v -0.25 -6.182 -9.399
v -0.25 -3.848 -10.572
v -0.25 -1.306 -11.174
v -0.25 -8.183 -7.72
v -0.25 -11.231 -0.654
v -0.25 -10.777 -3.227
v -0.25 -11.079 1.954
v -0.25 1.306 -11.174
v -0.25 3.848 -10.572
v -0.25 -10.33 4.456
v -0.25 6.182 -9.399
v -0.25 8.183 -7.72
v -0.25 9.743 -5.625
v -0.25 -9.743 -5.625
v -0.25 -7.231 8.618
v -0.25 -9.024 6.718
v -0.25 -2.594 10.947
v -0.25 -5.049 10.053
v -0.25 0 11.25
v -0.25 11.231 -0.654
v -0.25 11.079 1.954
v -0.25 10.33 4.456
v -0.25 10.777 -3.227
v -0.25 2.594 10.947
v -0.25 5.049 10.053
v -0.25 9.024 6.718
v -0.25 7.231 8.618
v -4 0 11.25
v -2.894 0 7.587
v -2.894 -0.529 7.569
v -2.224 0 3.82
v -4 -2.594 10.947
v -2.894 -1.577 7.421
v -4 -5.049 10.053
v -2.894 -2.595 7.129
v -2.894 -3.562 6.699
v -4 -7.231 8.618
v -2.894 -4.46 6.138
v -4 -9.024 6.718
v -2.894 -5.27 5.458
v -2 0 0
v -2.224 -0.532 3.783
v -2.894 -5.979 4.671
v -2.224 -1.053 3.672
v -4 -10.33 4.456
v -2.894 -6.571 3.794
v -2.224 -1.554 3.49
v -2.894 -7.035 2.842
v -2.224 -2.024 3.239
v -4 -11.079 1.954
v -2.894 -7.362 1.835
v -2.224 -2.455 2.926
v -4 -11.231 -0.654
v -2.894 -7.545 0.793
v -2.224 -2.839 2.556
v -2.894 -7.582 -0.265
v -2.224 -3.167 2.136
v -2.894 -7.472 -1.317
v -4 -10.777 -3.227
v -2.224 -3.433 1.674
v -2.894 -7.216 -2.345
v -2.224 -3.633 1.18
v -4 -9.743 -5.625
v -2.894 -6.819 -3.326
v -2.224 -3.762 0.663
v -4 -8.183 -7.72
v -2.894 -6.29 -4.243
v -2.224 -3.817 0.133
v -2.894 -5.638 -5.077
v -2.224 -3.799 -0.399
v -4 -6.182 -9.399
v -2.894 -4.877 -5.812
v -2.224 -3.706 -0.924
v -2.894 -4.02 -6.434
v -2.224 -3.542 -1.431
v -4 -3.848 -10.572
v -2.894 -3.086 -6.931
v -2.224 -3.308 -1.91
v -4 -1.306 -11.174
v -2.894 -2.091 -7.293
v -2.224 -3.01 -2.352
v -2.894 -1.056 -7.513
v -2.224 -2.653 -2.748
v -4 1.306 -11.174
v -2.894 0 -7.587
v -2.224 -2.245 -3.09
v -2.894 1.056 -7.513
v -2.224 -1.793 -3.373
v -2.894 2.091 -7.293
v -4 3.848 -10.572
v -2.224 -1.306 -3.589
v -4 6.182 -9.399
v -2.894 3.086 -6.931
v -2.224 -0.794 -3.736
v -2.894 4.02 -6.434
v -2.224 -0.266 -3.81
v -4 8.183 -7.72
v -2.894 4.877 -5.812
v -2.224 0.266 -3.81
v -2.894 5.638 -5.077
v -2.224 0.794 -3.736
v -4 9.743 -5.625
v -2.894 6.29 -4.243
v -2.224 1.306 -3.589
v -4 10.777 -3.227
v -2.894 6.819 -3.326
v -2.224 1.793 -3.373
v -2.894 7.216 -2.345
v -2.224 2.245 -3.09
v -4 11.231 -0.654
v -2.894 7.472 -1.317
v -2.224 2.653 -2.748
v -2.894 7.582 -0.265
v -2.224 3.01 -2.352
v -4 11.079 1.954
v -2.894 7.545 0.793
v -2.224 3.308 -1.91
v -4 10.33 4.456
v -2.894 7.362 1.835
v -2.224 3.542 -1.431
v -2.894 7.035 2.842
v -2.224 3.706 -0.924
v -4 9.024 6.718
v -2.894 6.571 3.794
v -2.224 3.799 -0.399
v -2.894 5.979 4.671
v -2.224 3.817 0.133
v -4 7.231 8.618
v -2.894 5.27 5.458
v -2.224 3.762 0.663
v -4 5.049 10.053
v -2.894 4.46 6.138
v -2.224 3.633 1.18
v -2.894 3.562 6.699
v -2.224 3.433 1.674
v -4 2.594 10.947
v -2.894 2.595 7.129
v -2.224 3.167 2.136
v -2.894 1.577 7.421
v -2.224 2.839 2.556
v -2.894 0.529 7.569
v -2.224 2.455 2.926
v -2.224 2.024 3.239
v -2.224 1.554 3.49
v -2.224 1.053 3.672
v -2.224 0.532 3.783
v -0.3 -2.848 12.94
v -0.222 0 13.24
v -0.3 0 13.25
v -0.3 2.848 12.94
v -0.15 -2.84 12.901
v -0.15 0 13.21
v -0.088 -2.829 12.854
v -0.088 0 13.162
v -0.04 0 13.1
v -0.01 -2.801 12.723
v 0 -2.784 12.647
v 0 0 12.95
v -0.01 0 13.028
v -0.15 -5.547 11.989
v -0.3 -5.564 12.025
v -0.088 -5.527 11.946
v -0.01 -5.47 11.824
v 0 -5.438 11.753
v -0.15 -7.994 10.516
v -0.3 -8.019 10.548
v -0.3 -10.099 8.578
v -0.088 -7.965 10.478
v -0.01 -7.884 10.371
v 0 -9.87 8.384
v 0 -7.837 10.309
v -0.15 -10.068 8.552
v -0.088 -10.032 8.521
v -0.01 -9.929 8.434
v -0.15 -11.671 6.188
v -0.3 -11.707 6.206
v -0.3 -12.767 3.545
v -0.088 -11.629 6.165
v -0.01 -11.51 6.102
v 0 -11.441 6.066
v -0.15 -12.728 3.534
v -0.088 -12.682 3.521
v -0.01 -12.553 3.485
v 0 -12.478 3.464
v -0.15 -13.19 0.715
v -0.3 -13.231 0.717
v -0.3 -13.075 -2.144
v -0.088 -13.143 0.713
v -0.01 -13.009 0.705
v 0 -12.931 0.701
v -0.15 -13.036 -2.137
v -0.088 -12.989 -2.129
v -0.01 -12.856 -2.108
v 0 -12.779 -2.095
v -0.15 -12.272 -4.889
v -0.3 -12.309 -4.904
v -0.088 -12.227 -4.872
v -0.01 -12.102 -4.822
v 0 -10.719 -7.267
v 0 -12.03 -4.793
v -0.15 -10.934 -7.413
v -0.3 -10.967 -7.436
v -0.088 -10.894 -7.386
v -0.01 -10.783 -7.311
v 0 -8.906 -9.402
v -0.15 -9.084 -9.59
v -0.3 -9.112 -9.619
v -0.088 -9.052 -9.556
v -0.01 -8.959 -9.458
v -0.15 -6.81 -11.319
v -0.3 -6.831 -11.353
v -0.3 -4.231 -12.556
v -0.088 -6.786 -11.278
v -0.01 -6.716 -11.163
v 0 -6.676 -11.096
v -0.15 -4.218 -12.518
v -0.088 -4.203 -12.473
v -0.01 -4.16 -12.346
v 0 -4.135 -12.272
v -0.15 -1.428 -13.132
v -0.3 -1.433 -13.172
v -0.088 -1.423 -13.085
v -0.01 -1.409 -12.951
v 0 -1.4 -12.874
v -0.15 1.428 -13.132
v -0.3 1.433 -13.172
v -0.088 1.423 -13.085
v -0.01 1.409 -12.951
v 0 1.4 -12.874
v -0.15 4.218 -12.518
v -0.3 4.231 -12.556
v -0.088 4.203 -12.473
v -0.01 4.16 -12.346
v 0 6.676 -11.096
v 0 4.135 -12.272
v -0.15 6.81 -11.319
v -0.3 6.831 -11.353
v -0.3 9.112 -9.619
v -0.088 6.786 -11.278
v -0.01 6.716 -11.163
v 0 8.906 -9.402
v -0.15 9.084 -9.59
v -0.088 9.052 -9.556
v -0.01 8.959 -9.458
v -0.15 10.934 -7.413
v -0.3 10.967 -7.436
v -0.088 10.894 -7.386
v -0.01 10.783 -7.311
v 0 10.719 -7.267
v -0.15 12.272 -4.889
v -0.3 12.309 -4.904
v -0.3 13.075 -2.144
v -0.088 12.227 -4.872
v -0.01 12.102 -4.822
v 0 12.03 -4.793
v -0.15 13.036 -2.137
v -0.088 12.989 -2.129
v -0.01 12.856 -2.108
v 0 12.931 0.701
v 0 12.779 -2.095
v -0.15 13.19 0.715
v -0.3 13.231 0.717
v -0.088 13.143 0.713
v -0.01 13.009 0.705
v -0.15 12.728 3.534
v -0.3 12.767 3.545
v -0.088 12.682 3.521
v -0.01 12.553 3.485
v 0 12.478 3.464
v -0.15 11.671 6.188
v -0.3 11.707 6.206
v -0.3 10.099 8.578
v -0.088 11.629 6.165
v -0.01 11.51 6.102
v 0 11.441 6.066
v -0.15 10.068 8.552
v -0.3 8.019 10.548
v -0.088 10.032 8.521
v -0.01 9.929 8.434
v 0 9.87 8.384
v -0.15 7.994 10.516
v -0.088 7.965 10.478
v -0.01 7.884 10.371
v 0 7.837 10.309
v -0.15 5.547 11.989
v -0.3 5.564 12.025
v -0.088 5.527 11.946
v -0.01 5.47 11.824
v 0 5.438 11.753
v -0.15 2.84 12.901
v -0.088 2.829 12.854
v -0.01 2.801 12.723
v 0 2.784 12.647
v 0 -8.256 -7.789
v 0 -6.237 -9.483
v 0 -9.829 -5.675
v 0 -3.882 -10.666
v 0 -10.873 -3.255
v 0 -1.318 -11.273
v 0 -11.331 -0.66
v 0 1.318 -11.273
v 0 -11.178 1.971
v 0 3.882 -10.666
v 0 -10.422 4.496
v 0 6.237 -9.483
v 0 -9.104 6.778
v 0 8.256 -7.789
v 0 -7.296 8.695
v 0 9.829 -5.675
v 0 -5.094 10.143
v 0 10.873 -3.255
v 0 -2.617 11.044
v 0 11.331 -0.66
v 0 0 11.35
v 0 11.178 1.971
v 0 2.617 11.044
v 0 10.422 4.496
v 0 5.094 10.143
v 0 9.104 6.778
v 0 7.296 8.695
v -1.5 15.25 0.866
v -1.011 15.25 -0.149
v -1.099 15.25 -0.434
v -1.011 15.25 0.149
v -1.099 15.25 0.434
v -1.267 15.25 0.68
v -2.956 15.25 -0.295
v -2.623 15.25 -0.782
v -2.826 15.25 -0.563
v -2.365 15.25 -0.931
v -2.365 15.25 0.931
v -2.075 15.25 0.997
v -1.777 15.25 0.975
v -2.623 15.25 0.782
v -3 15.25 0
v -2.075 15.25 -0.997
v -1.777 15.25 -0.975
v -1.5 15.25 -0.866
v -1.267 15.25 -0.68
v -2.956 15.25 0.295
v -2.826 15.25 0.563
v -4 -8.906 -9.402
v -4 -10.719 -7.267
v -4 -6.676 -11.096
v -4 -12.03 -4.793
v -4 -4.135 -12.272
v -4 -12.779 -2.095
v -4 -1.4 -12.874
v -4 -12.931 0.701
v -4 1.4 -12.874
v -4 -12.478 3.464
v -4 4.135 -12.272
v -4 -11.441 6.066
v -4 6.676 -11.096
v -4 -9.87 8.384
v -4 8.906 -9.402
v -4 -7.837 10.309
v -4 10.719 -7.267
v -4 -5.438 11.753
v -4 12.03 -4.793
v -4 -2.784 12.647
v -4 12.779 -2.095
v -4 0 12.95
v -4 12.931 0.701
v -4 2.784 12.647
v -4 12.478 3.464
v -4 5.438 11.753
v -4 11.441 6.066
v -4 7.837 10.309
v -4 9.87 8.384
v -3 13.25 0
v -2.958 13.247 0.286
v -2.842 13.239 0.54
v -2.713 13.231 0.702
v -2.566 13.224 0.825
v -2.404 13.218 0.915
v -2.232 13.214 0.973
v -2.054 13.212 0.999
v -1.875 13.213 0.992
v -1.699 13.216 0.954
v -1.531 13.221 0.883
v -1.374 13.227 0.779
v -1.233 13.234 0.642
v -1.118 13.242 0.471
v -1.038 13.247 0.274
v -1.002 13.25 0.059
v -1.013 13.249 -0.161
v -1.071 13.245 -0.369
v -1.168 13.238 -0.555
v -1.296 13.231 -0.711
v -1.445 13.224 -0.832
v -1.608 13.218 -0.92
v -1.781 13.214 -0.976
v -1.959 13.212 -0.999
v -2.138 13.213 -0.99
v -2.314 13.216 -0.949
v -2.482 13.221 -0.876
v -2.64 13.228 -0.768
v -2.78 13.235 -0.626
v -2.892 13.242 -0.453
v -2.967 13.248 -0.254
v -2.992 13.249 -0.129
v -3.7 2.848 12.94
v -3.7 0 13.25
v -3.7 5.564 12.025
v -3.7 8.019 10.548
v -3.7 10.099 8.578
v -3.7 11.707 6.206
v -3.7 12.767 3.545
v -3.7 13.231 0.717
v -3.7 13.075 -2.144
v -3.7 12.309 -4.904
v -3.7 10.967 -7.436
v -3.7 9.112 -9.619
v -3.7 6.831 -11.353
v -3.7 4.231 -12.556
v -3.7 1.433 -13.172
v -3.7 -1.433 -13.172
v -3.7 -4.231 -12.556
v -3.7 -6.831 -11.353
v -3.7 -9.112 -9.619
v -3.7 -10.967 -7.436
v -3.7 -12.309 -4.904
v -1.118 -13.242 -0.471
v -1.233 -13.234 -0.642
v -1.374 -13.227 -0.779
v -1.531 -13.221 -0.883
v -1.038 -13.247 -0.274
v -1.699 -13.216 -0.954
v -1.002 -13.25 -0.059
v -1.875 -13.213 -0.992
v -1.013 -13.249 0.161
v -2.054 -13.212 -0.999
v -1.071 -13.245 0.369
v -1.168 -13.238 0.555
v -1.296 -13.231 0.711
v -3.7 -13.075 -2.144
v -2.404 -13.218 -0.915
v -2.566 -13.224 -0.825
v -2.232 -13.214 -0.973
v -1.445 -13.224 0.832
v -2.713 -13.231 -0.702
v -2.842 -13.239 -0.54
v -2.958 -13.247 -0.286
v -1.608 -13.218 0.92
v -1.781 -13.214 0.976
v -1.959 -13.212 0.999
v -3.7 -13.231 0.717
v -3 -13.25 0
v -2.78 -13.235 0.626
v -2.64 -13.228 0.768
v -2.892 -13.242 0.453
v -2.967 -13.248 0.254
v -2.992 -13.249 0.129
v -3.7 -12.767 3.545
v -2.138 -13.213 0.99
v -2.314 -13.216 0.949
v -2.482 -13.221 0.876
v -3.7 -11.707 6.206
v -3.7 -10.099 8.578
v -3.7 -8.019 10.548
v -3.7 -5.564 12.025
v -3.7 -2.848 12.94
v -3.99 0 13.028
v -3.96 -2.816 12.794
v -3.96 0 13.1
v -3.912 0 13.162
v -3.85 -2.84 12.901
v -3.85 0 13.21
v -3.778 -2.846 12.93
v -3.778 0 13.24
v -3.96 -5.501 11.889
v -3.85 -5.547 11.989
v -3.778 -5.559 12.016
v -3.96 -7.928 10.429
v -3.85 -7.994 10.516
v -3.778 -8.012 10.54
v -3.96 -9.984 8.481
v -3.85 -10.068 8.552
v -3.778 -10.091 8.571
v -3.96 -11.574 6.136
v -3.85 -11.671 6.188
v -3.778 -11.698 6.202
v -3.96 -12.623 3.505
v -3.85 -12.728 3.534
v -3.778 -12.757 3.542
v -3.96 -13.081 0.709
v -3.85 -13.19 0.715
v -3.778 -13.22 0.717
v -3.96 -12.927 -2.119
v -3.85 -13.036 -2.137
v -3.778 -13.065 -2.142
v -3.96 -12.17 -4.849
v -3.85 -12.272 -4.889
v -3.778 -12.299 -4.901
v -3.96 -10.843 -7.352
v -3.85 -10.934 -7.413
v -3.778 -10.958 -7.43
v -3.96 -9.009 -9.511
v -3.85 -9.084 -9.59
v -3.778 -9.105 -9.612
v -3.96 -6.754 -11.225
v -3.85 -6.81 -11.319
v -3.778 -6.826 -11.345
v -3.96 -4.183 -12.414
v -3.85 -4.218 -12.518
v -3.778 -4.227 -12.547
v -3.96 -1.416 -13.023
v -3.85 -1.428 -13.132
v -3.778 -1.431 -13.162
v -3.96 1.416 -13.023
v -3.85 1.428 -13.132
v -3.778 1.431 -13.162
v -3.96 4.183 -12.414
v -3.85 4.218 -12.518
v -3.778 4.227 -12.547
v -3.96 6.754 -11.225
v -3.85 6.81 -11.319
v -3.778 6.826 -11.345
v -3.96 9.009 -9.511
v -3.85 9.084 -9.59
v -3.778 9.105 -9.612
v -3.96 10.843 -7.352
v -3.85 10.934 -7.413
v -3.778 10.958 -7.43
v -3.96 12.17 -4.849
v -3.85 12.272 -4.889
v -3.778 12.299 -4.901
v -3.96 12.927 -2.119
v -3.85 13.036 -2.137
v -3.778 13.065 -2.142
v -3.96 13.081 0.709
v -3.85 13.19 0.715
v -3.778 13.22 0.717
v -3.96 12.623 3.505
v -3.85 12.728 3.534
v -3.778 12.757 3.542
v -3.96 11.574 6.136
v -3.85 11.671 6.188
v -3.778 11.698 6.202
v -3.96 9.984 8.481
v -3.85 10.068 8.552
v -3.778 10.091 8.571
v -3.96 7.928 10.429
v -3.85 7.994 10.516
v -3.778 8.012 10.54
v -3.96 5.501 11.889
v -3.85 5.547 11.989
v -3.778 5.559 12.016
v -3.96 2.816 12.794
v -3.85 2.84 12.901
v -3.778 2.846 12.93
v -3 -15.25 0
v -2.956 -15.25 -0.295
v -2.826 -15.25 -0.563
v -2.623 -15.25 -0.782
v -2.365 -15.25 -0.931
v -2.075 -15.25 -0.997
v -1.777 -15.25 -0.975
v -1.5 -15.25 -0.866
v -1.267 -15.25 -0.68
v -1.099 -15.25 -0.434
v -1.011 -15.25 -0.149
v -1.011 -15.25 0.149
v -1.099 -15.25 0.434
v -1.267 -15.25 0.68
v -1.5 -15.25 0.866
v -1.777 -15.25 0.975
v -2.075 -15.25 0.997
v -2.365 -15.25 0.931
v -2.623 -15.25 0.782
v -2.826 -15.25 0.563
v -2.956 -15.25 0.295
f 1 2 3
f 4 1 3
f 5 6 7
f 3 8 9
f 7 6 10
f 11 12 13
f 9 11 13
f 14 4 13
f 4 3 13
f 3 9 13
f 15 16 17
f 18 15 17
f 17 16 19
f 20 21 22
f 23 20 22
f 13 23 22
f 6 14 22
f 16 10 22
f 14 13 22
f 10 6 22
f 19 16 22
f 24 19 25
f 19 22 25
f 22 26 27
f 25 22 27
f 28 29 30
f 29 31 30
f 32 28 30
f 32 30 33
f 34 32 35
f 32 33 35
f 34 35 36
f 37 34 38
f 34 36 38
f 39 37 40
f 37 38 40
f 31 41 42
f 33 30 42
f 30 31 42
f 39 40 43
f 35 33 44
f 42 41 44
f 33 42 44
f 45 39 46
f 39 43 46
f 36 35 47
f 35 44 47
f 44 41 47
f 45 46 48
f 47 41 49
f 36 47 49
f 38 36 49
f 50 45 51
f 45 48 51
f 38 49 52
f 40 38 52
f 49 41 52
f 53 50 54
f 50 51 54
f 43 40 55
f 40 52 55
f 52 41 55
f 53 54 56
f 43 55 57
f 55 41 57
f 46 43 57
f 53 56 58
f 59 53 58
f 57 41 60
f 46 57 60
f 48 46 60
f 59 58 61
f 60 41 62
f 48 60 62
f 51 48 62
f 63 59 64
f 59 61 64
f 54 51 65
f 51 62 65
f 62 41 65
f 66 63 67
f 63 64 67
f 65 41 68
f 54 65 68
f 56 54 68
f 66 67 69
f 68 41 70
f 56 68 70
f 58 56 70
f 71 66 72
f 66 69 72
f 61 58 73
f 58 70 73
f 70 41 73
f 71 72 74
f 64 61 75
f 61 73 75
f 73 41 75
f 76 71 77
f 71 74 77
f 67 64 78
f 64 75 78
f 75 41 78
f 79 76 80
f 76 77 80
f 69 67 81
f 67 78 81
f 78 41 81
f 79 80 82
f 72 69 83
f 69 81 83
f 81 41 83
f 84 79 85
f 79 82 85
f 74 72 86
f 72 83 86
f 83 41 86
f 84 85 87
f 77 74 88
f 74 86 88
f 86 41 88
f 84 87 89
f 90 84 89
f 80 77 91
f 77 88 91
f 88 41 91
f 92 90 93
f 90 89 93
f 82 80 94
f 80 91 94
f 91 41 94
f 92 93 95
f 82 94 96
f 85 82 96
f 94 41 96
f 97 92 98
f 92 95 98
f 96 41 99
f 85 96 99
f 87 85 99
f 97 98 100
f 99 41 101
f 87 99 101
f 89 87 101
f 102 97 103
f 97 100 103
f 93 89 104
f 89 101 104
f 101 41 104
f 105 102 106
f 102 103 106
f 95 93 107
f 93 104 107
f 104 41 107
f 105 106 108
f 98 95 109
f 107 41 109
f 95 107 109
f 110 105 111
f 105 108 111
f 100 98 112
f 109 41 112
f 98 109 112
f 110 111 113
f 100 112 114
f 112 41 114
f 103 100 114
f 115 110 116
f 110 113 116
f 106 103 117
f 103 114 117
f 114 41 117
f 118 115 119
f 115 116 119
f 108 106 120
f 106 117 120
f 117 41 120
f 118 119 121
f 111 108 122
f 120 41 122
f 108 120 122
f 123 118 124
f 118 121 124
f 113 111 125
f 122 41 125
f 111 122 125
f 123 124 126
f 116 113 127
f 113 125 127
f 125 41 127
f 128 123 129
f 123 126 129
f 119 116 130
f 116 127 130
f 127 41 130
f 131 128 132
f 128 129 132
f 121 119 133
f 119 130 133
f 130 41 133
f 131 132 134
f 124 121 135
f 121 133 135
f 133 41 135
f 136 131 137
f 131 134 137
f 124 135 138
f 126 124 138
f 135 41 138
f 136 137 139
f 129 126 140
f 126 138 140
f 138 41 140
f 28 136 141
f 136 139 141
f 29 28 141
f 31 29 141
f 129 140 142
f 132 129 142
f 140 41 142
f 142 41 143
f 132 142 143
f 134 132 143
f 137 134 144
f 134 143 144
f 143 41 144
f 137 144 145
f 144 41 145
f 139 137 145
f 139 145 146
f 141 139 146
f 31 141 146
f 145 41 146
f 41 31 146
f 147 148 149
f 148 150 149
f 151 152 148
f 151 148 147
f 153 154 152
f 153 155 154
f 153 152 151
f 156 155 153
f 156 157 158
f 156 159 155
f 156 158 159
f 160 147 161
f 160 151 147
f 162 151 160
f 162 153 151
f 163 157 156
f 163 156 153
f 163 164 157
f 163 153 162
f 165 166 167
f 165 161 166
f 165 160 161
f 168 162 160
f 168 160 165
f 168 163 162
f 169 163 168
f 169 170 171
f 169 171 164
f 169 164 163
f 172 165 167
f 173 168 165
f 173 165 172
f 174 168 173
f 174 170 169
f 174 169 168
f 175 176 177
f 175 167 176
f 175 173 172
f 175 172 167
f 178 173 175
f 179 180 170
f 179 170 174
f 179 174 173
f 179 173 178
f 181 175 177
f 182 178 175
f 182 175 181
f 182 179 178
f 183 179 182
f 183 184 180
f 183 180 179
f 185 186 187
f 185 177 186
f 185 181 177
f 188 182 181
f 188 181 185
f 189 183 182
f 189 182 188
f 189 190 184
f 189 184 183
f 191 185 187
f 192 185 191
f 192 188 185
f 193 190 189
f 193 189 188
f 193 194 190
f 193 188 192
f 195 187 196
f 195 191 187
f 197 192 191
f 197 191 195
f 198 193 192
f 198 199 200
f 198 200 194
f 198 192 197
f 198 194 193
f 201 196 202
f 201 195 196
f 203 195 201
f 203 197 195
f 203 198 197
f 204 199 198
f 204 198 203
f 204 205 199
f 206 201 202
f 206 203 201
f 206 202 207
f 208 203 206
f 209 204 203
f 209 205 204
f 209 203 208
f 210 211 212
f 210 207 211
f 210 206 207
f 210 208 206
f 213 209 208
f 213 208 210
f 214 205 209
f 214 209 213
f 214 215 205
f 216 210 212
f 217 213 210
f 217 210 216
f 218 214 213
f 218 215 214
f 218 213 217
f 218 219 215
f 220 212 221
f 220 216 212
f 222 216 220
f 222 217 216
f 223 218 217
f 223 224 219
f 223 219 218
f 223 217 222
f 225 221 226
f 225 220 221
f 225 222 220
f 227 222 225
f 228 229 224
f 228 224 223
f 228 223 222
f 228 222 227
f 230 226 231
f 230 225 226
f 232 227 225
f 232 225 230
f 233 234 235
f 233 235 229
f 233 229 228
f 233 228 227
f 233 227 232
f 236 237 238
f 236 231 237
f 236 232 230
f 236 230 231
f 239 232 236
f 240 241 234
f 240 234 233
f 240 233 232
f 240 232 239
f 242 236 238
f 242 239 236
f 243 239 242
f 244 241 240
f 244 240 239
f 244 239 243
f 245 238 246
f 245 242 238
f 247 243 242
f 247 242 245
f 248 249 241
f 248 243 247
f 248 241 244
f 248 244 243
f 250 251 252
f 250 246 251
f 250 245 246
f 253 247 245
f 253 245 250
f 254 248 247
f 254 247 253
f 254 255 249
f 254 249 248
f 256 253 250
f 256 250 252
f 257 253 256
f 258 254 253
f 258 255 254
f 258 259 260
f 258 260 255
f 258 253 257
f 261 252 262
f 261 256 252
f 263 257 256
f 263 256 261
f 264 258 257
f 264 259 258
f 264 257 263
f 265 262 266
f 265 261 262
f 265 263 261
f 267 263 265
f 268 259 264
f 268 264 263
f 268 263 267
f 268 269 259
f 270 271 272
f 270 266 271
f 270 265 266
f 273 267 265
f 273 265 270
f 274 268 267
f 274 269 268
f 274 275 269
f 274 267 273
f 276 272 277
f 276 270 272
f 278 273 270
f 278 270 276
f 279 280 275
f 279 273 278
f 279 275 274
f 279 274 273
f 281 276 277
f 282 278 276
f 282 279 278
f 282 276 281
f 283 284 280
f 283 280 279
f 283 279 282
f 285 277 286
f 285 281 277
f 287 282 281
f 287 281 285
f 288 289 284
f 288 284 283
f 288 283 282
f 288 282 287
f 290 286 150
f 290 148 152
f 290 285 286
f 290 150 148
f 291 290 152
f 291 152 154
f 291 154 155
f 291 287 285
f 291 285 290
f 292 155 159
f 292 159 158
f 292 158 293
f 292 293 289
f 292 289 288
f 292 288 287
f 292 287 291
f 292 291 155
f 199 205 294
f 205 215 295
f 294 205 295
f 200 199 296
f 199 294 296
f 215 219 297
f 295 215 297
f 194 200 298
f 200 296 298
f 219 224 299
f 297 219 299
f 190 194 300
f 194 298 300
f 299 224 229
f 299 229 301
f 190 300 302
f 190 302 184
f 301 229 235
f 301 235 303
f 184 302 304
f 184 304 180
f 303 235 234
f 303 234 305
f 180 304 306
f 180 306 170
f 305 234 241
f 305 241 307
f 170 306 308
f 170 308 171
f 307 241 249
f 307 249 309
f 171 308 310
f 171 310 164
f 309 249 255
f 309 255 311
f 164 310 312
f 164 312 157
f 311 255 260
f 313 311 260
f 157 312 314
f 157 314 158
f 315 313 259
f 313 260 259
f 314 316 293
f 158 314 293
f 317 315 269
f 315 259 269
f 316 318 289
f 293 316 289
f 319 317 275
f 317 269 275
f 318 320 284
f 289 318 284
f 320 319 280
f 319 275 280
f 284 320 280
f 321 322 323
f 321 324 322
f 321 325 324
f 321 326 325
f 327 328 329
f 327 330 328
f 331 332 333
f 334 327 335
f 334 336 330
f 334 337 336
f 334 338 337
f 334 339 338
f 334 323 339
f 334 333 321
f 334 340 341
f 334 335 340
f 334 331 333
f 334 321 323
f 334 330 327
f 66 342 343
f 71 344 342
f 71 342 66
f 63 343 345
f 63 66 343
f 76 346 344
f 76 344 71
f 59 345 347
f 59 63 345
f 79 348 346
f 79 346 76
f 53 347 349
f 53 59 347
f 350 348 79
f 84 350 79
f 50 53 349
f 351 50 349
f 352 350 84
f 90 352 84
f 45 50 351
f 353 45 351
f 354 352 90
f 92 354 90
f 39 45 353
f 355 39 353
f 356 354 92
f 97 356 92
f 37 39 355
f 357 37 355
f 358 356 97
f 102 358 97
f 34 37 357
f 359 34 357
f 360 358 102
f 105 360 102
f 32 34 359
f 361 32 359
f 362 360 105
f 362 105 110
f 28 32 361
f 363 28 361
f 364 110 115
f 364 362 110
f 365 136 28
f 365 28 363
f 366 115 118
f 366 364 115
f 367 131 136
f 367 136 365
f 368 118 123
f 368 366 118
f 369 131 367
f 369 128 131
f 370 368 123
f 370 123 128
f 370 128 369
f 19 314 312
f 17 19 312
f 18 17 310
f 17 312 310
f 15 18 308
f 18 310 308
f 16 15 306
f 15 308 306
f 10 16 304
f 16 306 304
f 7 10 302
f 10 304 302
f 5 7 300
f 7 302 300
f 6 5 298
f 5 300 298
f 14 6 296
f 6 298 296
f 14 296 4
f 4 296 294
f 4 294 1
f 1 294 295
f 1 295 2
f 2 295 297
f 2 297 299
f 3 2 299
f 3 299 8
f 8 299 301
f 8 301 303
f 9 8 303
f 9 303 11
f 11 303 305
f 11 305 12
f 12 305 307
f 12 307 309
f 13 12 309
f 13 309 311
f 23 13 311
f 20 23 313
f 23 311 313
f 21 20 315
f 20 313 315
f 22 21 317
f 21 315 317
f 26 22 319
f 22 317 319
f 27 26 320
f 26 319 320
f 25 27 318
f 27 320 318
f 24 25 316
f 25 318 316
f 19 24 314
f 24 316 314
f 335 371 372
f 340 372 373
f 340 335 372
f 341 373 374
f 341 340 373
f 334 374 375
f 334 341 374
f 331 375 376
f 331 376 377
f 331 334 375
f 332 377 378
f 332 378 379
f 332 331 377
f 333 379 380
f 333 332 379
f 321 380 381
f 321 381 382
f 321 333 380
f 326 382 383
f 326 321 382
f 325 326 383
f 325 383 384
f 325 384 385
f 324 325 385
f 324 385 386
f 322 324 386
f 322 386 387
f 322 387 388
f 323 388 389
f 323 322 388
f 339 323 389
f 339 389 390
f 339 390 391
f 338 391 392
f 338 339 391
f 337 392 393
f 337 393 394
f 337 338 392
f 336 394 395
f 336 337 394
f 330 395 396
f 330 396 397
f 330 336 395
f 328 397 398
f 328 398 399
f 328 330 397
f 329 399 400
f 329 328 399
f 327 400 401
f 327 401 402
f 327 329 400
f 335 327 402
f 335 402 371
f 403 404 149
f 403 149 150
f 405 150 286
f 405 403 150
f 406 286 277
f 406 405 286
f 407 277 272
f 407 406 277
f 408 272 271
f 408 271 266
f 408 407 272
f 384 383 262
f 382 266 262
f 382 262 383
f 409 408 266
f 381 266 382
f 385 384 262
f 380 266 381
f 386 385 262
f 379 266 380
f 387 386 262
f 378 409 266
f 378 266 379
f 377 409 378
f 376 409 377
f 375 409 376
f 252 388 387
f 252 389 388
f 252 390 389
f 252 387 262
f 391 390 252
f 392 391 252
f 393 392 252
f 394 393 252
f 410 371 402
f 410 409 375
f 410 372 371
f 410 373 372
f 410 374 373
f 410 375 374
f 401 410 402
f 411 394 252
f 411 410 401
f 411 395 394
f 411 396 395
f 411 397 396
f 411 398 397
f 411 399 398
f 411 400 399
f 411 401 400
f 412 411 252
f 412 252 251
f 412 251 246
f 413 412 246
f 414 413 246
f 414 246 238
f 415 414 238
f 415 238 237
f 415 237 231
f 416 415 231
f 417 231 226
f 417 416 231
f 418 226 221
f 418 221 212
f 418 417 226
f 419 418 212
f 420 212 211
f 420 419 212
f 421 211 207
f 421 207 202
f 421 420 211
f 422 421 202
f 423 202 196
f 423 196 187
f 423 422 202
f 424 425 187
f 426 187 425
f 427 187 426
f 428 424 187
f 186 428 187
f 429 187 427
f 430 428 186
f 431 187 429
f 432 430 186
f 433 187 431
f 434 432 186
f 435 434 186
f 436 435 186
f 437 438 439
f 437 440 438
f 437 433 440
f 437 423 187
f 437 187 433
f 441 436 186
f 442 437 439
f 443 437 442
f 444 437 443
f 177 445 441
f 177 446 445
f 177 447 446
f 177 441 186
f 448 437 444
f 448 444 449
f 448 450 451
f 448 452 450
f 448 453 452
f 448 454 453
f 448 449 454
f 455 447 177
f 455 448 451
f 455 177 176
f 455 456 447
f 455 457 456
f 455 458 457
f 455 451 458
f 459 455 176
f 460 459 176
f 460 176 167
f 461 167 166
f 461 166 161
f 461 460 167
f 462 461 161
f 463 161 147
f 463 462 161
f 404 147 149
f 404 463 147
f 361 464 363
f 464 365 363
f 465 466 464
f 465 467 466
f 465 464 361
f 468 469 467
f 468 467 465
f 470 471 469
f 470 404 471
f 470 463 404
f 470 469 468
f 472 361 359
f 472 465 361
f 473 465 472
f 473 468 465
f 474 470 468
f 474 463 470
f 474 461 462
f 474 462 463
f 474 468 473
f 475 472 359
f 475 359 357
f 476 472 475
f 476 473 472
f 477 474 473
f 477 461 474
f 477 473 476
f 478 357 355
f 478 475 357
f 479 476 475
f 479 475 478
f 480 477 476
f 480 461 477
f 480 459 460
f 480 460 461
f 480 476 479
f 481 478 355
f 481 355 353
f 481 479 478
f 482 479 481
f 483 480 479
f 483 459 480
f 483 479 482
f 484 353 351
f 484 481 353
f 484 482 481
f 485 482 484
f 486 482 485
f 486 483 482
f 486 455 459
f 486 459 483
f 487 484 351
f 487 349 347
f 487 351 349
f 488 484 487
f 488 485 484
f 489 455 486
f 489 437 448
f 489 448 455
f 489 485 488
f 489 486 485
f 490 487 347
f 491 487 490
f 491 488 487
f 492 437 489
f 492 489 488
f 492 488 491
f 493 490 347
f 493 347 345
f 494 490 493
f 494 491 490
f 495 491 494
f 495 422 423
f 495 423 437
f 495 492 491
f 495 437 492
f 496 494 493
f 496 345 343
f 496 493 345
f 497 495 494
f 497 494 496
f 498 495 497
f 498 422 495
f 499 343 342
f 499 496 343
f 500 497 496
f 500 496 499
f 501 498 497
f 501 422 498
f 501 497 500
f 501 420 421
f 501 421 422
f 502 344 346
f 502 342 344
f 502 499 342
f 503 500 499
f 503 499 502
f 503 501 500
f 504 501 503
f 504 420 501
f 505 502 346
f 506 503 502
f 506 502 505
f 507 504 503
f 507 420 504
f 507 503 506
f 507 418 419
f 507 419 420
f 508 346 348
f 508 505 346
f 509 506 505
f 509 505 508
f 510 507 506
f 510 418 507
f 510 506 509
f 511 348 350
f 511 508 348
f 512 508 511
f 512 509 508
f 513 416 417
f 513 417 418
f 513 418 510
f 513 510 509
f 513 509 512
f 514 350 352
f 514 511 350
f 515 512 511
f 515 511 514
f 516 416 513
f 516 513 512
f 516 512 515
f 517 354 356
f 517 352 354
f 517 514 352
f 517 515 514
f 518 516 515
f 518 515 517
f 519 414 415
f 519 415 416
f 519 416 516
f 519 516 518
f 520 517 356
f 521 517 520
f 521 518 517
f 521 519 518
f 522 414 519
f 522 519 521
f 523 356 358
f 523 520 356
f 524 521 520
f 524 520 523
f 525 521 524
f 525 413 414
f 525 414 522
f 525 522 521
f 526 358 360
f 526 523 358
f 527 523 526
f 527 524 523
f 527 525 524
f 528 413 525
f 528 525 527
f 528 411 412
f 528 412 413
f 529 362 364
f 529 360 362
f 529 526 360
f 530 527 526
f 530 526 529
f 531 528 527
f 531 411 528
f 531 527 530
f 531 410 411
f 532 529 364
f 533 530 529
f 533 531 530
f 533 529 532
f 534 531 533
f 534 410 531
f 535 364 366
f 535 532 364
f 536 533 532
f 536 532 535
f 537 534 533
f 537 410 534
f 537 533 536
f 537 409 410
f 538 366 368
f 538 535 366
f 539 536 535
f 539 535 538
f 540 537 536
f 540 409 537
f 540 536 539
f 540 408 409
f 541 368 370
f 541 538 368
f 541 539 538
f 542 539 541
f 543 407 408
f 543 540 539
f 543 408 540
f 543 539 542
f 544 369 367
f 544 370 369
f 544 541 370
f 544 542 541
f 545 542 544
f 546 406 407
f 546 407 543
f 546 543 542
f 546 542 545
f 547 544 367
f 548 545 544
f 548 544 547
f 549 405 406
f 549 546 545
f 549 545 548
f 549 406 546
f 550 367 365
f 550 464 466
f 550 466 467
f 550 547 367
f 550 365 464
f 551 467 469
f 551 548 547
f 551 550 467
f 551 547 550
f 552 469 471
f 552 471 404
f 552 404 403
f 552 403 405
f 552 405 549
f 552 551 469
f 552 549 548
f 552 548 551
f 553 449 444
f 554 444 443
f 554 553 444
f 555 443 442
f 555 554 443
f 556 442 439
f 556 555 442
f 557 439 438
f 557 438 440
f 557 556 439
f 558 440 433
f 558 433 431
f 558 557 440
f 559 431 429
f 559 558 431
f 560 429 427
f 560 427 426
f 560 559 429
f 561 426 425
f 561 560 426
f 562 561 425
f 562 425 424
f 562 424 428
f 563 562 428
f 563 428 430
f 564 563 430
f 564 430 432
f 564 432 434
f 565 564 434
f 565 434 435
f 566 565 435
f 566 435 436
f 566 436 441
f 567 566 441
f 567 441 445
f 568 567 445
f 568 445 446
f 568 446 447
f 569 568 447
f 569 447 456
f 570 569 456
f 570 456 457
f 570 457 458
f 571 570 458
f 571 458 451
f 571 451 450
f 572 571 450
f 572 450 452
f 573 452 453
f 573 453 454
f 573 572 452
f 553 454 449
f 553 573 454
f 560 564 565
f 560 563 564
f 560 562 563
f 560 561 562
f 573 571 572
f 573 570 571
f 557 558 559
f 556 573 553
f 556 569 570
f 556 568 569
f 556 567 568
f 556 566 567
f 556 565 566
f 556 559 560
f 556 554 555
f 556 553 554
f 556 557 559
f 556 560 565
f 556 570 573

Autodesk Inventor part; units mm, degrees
ref_plane "YZ Plane" through (0, 0, 0) normal (1, 0, 0) x (0, 1, 0)
ref_plane "XY Plane" through (0, 0, 0) normal (0, 0, 1) x (1, 0, 0)
sketch "Sketch1" plane through (0, 0, 0) normal (0, 1, 0) x (-1, 0, 0)
  line L0 (0, 11.35) -> (0, 12.95)
  line L1 (0.3, 13.25) -> (3.7, 13.25)
  line L2 (0, -11.35) -> (0, -13.25)
  line L3 (0, -13.25) -> (4, -13.25)
  line L4 (4, 12.95) -> (4, 11.25)
  line L5 (4, -13.25) -> (4, -11.25)
  arc A0 (4, 11.25) -> (4, -11.25) centre (34.6406, 0) ccw
  line L6 (0.25, 11.25) -> (0.25, 11.25)
  line L7 (0.25, 11.25) -> (0.25, -11.25)
  line L8 (0.25, -11.25) -> (0.25, -11.25)
  arc A1 (4, 12.95) -> (3.7, 13.25) centre (3.7, 12.95) ccw
  arc A2 (0.3, 13.25) -> (0, 12.95) centre (0.3, 12.95) ccw
  line L9 (0, 11.35) -> (0.25, 11.25)
  line L10 (0, -11.35) -> (0.25, -11.25)
  line L11 (0, 0) -> (3.4534, 0)
  line L12 (2, 0) -> (0.25, 0)
  point P0 (0, 13.25)
  point P1 (4, 13.25)
  point P2 (0, 11.25)
  point P3 (0, -11.25)
  dimension "d0" = 13.25
  dimension "d1" = 26.5
  dimension "d2" = 4
  dimension "d4" = 2
  dimension "d5" = 2
  dimension "d6" = 0.25
  dimension "d7" = 0.3
  dimension "d8" = 0.1
  dimension "d9" = 0.25
  dimension "d10" = 0.1
  dimension "d11" = 0.25
revolve "Revolution1" add sketch "Sketch1" angle 360 about axis through (0, 0, 0) along (-1, 0, 0) contours L0 A2 L1 A1 L4 A0 L11 L7 L9
ref_plane "Work Plane1" through (-2, 13.25, 0) normal (0, 1, 0) x (-1, 0, 0)
sketch "Sketch2" plane through (-2, 13.25, 0) normal (0, 1, 0) x (-1, 0, 0)
  arc A0 (2, 11.25) -> (2, -11.25) centre (32.6406, 0) ccw projected
  circle A1 centre (0, 0) radius 1
  point P0 (-2, 0)
  dimension "d13" = 2
extrude "Extrusion1" add sketch "Sketch2" along normal blind 2 and the other way blind 1
pattern_circular "Circular Pattern1" count 2 over 360 about axis through (-2, 0, 0) along (-1, 0, 0) of "Extrusion1"
ref_plane "Work Plane2" through (-2, -13.25, 0) normal (0, -1, 0) x (-1, 0, 0)
equation "\"d10\" = d8"
equation "\"d11\" = d9"
properties part number "Espejo"
